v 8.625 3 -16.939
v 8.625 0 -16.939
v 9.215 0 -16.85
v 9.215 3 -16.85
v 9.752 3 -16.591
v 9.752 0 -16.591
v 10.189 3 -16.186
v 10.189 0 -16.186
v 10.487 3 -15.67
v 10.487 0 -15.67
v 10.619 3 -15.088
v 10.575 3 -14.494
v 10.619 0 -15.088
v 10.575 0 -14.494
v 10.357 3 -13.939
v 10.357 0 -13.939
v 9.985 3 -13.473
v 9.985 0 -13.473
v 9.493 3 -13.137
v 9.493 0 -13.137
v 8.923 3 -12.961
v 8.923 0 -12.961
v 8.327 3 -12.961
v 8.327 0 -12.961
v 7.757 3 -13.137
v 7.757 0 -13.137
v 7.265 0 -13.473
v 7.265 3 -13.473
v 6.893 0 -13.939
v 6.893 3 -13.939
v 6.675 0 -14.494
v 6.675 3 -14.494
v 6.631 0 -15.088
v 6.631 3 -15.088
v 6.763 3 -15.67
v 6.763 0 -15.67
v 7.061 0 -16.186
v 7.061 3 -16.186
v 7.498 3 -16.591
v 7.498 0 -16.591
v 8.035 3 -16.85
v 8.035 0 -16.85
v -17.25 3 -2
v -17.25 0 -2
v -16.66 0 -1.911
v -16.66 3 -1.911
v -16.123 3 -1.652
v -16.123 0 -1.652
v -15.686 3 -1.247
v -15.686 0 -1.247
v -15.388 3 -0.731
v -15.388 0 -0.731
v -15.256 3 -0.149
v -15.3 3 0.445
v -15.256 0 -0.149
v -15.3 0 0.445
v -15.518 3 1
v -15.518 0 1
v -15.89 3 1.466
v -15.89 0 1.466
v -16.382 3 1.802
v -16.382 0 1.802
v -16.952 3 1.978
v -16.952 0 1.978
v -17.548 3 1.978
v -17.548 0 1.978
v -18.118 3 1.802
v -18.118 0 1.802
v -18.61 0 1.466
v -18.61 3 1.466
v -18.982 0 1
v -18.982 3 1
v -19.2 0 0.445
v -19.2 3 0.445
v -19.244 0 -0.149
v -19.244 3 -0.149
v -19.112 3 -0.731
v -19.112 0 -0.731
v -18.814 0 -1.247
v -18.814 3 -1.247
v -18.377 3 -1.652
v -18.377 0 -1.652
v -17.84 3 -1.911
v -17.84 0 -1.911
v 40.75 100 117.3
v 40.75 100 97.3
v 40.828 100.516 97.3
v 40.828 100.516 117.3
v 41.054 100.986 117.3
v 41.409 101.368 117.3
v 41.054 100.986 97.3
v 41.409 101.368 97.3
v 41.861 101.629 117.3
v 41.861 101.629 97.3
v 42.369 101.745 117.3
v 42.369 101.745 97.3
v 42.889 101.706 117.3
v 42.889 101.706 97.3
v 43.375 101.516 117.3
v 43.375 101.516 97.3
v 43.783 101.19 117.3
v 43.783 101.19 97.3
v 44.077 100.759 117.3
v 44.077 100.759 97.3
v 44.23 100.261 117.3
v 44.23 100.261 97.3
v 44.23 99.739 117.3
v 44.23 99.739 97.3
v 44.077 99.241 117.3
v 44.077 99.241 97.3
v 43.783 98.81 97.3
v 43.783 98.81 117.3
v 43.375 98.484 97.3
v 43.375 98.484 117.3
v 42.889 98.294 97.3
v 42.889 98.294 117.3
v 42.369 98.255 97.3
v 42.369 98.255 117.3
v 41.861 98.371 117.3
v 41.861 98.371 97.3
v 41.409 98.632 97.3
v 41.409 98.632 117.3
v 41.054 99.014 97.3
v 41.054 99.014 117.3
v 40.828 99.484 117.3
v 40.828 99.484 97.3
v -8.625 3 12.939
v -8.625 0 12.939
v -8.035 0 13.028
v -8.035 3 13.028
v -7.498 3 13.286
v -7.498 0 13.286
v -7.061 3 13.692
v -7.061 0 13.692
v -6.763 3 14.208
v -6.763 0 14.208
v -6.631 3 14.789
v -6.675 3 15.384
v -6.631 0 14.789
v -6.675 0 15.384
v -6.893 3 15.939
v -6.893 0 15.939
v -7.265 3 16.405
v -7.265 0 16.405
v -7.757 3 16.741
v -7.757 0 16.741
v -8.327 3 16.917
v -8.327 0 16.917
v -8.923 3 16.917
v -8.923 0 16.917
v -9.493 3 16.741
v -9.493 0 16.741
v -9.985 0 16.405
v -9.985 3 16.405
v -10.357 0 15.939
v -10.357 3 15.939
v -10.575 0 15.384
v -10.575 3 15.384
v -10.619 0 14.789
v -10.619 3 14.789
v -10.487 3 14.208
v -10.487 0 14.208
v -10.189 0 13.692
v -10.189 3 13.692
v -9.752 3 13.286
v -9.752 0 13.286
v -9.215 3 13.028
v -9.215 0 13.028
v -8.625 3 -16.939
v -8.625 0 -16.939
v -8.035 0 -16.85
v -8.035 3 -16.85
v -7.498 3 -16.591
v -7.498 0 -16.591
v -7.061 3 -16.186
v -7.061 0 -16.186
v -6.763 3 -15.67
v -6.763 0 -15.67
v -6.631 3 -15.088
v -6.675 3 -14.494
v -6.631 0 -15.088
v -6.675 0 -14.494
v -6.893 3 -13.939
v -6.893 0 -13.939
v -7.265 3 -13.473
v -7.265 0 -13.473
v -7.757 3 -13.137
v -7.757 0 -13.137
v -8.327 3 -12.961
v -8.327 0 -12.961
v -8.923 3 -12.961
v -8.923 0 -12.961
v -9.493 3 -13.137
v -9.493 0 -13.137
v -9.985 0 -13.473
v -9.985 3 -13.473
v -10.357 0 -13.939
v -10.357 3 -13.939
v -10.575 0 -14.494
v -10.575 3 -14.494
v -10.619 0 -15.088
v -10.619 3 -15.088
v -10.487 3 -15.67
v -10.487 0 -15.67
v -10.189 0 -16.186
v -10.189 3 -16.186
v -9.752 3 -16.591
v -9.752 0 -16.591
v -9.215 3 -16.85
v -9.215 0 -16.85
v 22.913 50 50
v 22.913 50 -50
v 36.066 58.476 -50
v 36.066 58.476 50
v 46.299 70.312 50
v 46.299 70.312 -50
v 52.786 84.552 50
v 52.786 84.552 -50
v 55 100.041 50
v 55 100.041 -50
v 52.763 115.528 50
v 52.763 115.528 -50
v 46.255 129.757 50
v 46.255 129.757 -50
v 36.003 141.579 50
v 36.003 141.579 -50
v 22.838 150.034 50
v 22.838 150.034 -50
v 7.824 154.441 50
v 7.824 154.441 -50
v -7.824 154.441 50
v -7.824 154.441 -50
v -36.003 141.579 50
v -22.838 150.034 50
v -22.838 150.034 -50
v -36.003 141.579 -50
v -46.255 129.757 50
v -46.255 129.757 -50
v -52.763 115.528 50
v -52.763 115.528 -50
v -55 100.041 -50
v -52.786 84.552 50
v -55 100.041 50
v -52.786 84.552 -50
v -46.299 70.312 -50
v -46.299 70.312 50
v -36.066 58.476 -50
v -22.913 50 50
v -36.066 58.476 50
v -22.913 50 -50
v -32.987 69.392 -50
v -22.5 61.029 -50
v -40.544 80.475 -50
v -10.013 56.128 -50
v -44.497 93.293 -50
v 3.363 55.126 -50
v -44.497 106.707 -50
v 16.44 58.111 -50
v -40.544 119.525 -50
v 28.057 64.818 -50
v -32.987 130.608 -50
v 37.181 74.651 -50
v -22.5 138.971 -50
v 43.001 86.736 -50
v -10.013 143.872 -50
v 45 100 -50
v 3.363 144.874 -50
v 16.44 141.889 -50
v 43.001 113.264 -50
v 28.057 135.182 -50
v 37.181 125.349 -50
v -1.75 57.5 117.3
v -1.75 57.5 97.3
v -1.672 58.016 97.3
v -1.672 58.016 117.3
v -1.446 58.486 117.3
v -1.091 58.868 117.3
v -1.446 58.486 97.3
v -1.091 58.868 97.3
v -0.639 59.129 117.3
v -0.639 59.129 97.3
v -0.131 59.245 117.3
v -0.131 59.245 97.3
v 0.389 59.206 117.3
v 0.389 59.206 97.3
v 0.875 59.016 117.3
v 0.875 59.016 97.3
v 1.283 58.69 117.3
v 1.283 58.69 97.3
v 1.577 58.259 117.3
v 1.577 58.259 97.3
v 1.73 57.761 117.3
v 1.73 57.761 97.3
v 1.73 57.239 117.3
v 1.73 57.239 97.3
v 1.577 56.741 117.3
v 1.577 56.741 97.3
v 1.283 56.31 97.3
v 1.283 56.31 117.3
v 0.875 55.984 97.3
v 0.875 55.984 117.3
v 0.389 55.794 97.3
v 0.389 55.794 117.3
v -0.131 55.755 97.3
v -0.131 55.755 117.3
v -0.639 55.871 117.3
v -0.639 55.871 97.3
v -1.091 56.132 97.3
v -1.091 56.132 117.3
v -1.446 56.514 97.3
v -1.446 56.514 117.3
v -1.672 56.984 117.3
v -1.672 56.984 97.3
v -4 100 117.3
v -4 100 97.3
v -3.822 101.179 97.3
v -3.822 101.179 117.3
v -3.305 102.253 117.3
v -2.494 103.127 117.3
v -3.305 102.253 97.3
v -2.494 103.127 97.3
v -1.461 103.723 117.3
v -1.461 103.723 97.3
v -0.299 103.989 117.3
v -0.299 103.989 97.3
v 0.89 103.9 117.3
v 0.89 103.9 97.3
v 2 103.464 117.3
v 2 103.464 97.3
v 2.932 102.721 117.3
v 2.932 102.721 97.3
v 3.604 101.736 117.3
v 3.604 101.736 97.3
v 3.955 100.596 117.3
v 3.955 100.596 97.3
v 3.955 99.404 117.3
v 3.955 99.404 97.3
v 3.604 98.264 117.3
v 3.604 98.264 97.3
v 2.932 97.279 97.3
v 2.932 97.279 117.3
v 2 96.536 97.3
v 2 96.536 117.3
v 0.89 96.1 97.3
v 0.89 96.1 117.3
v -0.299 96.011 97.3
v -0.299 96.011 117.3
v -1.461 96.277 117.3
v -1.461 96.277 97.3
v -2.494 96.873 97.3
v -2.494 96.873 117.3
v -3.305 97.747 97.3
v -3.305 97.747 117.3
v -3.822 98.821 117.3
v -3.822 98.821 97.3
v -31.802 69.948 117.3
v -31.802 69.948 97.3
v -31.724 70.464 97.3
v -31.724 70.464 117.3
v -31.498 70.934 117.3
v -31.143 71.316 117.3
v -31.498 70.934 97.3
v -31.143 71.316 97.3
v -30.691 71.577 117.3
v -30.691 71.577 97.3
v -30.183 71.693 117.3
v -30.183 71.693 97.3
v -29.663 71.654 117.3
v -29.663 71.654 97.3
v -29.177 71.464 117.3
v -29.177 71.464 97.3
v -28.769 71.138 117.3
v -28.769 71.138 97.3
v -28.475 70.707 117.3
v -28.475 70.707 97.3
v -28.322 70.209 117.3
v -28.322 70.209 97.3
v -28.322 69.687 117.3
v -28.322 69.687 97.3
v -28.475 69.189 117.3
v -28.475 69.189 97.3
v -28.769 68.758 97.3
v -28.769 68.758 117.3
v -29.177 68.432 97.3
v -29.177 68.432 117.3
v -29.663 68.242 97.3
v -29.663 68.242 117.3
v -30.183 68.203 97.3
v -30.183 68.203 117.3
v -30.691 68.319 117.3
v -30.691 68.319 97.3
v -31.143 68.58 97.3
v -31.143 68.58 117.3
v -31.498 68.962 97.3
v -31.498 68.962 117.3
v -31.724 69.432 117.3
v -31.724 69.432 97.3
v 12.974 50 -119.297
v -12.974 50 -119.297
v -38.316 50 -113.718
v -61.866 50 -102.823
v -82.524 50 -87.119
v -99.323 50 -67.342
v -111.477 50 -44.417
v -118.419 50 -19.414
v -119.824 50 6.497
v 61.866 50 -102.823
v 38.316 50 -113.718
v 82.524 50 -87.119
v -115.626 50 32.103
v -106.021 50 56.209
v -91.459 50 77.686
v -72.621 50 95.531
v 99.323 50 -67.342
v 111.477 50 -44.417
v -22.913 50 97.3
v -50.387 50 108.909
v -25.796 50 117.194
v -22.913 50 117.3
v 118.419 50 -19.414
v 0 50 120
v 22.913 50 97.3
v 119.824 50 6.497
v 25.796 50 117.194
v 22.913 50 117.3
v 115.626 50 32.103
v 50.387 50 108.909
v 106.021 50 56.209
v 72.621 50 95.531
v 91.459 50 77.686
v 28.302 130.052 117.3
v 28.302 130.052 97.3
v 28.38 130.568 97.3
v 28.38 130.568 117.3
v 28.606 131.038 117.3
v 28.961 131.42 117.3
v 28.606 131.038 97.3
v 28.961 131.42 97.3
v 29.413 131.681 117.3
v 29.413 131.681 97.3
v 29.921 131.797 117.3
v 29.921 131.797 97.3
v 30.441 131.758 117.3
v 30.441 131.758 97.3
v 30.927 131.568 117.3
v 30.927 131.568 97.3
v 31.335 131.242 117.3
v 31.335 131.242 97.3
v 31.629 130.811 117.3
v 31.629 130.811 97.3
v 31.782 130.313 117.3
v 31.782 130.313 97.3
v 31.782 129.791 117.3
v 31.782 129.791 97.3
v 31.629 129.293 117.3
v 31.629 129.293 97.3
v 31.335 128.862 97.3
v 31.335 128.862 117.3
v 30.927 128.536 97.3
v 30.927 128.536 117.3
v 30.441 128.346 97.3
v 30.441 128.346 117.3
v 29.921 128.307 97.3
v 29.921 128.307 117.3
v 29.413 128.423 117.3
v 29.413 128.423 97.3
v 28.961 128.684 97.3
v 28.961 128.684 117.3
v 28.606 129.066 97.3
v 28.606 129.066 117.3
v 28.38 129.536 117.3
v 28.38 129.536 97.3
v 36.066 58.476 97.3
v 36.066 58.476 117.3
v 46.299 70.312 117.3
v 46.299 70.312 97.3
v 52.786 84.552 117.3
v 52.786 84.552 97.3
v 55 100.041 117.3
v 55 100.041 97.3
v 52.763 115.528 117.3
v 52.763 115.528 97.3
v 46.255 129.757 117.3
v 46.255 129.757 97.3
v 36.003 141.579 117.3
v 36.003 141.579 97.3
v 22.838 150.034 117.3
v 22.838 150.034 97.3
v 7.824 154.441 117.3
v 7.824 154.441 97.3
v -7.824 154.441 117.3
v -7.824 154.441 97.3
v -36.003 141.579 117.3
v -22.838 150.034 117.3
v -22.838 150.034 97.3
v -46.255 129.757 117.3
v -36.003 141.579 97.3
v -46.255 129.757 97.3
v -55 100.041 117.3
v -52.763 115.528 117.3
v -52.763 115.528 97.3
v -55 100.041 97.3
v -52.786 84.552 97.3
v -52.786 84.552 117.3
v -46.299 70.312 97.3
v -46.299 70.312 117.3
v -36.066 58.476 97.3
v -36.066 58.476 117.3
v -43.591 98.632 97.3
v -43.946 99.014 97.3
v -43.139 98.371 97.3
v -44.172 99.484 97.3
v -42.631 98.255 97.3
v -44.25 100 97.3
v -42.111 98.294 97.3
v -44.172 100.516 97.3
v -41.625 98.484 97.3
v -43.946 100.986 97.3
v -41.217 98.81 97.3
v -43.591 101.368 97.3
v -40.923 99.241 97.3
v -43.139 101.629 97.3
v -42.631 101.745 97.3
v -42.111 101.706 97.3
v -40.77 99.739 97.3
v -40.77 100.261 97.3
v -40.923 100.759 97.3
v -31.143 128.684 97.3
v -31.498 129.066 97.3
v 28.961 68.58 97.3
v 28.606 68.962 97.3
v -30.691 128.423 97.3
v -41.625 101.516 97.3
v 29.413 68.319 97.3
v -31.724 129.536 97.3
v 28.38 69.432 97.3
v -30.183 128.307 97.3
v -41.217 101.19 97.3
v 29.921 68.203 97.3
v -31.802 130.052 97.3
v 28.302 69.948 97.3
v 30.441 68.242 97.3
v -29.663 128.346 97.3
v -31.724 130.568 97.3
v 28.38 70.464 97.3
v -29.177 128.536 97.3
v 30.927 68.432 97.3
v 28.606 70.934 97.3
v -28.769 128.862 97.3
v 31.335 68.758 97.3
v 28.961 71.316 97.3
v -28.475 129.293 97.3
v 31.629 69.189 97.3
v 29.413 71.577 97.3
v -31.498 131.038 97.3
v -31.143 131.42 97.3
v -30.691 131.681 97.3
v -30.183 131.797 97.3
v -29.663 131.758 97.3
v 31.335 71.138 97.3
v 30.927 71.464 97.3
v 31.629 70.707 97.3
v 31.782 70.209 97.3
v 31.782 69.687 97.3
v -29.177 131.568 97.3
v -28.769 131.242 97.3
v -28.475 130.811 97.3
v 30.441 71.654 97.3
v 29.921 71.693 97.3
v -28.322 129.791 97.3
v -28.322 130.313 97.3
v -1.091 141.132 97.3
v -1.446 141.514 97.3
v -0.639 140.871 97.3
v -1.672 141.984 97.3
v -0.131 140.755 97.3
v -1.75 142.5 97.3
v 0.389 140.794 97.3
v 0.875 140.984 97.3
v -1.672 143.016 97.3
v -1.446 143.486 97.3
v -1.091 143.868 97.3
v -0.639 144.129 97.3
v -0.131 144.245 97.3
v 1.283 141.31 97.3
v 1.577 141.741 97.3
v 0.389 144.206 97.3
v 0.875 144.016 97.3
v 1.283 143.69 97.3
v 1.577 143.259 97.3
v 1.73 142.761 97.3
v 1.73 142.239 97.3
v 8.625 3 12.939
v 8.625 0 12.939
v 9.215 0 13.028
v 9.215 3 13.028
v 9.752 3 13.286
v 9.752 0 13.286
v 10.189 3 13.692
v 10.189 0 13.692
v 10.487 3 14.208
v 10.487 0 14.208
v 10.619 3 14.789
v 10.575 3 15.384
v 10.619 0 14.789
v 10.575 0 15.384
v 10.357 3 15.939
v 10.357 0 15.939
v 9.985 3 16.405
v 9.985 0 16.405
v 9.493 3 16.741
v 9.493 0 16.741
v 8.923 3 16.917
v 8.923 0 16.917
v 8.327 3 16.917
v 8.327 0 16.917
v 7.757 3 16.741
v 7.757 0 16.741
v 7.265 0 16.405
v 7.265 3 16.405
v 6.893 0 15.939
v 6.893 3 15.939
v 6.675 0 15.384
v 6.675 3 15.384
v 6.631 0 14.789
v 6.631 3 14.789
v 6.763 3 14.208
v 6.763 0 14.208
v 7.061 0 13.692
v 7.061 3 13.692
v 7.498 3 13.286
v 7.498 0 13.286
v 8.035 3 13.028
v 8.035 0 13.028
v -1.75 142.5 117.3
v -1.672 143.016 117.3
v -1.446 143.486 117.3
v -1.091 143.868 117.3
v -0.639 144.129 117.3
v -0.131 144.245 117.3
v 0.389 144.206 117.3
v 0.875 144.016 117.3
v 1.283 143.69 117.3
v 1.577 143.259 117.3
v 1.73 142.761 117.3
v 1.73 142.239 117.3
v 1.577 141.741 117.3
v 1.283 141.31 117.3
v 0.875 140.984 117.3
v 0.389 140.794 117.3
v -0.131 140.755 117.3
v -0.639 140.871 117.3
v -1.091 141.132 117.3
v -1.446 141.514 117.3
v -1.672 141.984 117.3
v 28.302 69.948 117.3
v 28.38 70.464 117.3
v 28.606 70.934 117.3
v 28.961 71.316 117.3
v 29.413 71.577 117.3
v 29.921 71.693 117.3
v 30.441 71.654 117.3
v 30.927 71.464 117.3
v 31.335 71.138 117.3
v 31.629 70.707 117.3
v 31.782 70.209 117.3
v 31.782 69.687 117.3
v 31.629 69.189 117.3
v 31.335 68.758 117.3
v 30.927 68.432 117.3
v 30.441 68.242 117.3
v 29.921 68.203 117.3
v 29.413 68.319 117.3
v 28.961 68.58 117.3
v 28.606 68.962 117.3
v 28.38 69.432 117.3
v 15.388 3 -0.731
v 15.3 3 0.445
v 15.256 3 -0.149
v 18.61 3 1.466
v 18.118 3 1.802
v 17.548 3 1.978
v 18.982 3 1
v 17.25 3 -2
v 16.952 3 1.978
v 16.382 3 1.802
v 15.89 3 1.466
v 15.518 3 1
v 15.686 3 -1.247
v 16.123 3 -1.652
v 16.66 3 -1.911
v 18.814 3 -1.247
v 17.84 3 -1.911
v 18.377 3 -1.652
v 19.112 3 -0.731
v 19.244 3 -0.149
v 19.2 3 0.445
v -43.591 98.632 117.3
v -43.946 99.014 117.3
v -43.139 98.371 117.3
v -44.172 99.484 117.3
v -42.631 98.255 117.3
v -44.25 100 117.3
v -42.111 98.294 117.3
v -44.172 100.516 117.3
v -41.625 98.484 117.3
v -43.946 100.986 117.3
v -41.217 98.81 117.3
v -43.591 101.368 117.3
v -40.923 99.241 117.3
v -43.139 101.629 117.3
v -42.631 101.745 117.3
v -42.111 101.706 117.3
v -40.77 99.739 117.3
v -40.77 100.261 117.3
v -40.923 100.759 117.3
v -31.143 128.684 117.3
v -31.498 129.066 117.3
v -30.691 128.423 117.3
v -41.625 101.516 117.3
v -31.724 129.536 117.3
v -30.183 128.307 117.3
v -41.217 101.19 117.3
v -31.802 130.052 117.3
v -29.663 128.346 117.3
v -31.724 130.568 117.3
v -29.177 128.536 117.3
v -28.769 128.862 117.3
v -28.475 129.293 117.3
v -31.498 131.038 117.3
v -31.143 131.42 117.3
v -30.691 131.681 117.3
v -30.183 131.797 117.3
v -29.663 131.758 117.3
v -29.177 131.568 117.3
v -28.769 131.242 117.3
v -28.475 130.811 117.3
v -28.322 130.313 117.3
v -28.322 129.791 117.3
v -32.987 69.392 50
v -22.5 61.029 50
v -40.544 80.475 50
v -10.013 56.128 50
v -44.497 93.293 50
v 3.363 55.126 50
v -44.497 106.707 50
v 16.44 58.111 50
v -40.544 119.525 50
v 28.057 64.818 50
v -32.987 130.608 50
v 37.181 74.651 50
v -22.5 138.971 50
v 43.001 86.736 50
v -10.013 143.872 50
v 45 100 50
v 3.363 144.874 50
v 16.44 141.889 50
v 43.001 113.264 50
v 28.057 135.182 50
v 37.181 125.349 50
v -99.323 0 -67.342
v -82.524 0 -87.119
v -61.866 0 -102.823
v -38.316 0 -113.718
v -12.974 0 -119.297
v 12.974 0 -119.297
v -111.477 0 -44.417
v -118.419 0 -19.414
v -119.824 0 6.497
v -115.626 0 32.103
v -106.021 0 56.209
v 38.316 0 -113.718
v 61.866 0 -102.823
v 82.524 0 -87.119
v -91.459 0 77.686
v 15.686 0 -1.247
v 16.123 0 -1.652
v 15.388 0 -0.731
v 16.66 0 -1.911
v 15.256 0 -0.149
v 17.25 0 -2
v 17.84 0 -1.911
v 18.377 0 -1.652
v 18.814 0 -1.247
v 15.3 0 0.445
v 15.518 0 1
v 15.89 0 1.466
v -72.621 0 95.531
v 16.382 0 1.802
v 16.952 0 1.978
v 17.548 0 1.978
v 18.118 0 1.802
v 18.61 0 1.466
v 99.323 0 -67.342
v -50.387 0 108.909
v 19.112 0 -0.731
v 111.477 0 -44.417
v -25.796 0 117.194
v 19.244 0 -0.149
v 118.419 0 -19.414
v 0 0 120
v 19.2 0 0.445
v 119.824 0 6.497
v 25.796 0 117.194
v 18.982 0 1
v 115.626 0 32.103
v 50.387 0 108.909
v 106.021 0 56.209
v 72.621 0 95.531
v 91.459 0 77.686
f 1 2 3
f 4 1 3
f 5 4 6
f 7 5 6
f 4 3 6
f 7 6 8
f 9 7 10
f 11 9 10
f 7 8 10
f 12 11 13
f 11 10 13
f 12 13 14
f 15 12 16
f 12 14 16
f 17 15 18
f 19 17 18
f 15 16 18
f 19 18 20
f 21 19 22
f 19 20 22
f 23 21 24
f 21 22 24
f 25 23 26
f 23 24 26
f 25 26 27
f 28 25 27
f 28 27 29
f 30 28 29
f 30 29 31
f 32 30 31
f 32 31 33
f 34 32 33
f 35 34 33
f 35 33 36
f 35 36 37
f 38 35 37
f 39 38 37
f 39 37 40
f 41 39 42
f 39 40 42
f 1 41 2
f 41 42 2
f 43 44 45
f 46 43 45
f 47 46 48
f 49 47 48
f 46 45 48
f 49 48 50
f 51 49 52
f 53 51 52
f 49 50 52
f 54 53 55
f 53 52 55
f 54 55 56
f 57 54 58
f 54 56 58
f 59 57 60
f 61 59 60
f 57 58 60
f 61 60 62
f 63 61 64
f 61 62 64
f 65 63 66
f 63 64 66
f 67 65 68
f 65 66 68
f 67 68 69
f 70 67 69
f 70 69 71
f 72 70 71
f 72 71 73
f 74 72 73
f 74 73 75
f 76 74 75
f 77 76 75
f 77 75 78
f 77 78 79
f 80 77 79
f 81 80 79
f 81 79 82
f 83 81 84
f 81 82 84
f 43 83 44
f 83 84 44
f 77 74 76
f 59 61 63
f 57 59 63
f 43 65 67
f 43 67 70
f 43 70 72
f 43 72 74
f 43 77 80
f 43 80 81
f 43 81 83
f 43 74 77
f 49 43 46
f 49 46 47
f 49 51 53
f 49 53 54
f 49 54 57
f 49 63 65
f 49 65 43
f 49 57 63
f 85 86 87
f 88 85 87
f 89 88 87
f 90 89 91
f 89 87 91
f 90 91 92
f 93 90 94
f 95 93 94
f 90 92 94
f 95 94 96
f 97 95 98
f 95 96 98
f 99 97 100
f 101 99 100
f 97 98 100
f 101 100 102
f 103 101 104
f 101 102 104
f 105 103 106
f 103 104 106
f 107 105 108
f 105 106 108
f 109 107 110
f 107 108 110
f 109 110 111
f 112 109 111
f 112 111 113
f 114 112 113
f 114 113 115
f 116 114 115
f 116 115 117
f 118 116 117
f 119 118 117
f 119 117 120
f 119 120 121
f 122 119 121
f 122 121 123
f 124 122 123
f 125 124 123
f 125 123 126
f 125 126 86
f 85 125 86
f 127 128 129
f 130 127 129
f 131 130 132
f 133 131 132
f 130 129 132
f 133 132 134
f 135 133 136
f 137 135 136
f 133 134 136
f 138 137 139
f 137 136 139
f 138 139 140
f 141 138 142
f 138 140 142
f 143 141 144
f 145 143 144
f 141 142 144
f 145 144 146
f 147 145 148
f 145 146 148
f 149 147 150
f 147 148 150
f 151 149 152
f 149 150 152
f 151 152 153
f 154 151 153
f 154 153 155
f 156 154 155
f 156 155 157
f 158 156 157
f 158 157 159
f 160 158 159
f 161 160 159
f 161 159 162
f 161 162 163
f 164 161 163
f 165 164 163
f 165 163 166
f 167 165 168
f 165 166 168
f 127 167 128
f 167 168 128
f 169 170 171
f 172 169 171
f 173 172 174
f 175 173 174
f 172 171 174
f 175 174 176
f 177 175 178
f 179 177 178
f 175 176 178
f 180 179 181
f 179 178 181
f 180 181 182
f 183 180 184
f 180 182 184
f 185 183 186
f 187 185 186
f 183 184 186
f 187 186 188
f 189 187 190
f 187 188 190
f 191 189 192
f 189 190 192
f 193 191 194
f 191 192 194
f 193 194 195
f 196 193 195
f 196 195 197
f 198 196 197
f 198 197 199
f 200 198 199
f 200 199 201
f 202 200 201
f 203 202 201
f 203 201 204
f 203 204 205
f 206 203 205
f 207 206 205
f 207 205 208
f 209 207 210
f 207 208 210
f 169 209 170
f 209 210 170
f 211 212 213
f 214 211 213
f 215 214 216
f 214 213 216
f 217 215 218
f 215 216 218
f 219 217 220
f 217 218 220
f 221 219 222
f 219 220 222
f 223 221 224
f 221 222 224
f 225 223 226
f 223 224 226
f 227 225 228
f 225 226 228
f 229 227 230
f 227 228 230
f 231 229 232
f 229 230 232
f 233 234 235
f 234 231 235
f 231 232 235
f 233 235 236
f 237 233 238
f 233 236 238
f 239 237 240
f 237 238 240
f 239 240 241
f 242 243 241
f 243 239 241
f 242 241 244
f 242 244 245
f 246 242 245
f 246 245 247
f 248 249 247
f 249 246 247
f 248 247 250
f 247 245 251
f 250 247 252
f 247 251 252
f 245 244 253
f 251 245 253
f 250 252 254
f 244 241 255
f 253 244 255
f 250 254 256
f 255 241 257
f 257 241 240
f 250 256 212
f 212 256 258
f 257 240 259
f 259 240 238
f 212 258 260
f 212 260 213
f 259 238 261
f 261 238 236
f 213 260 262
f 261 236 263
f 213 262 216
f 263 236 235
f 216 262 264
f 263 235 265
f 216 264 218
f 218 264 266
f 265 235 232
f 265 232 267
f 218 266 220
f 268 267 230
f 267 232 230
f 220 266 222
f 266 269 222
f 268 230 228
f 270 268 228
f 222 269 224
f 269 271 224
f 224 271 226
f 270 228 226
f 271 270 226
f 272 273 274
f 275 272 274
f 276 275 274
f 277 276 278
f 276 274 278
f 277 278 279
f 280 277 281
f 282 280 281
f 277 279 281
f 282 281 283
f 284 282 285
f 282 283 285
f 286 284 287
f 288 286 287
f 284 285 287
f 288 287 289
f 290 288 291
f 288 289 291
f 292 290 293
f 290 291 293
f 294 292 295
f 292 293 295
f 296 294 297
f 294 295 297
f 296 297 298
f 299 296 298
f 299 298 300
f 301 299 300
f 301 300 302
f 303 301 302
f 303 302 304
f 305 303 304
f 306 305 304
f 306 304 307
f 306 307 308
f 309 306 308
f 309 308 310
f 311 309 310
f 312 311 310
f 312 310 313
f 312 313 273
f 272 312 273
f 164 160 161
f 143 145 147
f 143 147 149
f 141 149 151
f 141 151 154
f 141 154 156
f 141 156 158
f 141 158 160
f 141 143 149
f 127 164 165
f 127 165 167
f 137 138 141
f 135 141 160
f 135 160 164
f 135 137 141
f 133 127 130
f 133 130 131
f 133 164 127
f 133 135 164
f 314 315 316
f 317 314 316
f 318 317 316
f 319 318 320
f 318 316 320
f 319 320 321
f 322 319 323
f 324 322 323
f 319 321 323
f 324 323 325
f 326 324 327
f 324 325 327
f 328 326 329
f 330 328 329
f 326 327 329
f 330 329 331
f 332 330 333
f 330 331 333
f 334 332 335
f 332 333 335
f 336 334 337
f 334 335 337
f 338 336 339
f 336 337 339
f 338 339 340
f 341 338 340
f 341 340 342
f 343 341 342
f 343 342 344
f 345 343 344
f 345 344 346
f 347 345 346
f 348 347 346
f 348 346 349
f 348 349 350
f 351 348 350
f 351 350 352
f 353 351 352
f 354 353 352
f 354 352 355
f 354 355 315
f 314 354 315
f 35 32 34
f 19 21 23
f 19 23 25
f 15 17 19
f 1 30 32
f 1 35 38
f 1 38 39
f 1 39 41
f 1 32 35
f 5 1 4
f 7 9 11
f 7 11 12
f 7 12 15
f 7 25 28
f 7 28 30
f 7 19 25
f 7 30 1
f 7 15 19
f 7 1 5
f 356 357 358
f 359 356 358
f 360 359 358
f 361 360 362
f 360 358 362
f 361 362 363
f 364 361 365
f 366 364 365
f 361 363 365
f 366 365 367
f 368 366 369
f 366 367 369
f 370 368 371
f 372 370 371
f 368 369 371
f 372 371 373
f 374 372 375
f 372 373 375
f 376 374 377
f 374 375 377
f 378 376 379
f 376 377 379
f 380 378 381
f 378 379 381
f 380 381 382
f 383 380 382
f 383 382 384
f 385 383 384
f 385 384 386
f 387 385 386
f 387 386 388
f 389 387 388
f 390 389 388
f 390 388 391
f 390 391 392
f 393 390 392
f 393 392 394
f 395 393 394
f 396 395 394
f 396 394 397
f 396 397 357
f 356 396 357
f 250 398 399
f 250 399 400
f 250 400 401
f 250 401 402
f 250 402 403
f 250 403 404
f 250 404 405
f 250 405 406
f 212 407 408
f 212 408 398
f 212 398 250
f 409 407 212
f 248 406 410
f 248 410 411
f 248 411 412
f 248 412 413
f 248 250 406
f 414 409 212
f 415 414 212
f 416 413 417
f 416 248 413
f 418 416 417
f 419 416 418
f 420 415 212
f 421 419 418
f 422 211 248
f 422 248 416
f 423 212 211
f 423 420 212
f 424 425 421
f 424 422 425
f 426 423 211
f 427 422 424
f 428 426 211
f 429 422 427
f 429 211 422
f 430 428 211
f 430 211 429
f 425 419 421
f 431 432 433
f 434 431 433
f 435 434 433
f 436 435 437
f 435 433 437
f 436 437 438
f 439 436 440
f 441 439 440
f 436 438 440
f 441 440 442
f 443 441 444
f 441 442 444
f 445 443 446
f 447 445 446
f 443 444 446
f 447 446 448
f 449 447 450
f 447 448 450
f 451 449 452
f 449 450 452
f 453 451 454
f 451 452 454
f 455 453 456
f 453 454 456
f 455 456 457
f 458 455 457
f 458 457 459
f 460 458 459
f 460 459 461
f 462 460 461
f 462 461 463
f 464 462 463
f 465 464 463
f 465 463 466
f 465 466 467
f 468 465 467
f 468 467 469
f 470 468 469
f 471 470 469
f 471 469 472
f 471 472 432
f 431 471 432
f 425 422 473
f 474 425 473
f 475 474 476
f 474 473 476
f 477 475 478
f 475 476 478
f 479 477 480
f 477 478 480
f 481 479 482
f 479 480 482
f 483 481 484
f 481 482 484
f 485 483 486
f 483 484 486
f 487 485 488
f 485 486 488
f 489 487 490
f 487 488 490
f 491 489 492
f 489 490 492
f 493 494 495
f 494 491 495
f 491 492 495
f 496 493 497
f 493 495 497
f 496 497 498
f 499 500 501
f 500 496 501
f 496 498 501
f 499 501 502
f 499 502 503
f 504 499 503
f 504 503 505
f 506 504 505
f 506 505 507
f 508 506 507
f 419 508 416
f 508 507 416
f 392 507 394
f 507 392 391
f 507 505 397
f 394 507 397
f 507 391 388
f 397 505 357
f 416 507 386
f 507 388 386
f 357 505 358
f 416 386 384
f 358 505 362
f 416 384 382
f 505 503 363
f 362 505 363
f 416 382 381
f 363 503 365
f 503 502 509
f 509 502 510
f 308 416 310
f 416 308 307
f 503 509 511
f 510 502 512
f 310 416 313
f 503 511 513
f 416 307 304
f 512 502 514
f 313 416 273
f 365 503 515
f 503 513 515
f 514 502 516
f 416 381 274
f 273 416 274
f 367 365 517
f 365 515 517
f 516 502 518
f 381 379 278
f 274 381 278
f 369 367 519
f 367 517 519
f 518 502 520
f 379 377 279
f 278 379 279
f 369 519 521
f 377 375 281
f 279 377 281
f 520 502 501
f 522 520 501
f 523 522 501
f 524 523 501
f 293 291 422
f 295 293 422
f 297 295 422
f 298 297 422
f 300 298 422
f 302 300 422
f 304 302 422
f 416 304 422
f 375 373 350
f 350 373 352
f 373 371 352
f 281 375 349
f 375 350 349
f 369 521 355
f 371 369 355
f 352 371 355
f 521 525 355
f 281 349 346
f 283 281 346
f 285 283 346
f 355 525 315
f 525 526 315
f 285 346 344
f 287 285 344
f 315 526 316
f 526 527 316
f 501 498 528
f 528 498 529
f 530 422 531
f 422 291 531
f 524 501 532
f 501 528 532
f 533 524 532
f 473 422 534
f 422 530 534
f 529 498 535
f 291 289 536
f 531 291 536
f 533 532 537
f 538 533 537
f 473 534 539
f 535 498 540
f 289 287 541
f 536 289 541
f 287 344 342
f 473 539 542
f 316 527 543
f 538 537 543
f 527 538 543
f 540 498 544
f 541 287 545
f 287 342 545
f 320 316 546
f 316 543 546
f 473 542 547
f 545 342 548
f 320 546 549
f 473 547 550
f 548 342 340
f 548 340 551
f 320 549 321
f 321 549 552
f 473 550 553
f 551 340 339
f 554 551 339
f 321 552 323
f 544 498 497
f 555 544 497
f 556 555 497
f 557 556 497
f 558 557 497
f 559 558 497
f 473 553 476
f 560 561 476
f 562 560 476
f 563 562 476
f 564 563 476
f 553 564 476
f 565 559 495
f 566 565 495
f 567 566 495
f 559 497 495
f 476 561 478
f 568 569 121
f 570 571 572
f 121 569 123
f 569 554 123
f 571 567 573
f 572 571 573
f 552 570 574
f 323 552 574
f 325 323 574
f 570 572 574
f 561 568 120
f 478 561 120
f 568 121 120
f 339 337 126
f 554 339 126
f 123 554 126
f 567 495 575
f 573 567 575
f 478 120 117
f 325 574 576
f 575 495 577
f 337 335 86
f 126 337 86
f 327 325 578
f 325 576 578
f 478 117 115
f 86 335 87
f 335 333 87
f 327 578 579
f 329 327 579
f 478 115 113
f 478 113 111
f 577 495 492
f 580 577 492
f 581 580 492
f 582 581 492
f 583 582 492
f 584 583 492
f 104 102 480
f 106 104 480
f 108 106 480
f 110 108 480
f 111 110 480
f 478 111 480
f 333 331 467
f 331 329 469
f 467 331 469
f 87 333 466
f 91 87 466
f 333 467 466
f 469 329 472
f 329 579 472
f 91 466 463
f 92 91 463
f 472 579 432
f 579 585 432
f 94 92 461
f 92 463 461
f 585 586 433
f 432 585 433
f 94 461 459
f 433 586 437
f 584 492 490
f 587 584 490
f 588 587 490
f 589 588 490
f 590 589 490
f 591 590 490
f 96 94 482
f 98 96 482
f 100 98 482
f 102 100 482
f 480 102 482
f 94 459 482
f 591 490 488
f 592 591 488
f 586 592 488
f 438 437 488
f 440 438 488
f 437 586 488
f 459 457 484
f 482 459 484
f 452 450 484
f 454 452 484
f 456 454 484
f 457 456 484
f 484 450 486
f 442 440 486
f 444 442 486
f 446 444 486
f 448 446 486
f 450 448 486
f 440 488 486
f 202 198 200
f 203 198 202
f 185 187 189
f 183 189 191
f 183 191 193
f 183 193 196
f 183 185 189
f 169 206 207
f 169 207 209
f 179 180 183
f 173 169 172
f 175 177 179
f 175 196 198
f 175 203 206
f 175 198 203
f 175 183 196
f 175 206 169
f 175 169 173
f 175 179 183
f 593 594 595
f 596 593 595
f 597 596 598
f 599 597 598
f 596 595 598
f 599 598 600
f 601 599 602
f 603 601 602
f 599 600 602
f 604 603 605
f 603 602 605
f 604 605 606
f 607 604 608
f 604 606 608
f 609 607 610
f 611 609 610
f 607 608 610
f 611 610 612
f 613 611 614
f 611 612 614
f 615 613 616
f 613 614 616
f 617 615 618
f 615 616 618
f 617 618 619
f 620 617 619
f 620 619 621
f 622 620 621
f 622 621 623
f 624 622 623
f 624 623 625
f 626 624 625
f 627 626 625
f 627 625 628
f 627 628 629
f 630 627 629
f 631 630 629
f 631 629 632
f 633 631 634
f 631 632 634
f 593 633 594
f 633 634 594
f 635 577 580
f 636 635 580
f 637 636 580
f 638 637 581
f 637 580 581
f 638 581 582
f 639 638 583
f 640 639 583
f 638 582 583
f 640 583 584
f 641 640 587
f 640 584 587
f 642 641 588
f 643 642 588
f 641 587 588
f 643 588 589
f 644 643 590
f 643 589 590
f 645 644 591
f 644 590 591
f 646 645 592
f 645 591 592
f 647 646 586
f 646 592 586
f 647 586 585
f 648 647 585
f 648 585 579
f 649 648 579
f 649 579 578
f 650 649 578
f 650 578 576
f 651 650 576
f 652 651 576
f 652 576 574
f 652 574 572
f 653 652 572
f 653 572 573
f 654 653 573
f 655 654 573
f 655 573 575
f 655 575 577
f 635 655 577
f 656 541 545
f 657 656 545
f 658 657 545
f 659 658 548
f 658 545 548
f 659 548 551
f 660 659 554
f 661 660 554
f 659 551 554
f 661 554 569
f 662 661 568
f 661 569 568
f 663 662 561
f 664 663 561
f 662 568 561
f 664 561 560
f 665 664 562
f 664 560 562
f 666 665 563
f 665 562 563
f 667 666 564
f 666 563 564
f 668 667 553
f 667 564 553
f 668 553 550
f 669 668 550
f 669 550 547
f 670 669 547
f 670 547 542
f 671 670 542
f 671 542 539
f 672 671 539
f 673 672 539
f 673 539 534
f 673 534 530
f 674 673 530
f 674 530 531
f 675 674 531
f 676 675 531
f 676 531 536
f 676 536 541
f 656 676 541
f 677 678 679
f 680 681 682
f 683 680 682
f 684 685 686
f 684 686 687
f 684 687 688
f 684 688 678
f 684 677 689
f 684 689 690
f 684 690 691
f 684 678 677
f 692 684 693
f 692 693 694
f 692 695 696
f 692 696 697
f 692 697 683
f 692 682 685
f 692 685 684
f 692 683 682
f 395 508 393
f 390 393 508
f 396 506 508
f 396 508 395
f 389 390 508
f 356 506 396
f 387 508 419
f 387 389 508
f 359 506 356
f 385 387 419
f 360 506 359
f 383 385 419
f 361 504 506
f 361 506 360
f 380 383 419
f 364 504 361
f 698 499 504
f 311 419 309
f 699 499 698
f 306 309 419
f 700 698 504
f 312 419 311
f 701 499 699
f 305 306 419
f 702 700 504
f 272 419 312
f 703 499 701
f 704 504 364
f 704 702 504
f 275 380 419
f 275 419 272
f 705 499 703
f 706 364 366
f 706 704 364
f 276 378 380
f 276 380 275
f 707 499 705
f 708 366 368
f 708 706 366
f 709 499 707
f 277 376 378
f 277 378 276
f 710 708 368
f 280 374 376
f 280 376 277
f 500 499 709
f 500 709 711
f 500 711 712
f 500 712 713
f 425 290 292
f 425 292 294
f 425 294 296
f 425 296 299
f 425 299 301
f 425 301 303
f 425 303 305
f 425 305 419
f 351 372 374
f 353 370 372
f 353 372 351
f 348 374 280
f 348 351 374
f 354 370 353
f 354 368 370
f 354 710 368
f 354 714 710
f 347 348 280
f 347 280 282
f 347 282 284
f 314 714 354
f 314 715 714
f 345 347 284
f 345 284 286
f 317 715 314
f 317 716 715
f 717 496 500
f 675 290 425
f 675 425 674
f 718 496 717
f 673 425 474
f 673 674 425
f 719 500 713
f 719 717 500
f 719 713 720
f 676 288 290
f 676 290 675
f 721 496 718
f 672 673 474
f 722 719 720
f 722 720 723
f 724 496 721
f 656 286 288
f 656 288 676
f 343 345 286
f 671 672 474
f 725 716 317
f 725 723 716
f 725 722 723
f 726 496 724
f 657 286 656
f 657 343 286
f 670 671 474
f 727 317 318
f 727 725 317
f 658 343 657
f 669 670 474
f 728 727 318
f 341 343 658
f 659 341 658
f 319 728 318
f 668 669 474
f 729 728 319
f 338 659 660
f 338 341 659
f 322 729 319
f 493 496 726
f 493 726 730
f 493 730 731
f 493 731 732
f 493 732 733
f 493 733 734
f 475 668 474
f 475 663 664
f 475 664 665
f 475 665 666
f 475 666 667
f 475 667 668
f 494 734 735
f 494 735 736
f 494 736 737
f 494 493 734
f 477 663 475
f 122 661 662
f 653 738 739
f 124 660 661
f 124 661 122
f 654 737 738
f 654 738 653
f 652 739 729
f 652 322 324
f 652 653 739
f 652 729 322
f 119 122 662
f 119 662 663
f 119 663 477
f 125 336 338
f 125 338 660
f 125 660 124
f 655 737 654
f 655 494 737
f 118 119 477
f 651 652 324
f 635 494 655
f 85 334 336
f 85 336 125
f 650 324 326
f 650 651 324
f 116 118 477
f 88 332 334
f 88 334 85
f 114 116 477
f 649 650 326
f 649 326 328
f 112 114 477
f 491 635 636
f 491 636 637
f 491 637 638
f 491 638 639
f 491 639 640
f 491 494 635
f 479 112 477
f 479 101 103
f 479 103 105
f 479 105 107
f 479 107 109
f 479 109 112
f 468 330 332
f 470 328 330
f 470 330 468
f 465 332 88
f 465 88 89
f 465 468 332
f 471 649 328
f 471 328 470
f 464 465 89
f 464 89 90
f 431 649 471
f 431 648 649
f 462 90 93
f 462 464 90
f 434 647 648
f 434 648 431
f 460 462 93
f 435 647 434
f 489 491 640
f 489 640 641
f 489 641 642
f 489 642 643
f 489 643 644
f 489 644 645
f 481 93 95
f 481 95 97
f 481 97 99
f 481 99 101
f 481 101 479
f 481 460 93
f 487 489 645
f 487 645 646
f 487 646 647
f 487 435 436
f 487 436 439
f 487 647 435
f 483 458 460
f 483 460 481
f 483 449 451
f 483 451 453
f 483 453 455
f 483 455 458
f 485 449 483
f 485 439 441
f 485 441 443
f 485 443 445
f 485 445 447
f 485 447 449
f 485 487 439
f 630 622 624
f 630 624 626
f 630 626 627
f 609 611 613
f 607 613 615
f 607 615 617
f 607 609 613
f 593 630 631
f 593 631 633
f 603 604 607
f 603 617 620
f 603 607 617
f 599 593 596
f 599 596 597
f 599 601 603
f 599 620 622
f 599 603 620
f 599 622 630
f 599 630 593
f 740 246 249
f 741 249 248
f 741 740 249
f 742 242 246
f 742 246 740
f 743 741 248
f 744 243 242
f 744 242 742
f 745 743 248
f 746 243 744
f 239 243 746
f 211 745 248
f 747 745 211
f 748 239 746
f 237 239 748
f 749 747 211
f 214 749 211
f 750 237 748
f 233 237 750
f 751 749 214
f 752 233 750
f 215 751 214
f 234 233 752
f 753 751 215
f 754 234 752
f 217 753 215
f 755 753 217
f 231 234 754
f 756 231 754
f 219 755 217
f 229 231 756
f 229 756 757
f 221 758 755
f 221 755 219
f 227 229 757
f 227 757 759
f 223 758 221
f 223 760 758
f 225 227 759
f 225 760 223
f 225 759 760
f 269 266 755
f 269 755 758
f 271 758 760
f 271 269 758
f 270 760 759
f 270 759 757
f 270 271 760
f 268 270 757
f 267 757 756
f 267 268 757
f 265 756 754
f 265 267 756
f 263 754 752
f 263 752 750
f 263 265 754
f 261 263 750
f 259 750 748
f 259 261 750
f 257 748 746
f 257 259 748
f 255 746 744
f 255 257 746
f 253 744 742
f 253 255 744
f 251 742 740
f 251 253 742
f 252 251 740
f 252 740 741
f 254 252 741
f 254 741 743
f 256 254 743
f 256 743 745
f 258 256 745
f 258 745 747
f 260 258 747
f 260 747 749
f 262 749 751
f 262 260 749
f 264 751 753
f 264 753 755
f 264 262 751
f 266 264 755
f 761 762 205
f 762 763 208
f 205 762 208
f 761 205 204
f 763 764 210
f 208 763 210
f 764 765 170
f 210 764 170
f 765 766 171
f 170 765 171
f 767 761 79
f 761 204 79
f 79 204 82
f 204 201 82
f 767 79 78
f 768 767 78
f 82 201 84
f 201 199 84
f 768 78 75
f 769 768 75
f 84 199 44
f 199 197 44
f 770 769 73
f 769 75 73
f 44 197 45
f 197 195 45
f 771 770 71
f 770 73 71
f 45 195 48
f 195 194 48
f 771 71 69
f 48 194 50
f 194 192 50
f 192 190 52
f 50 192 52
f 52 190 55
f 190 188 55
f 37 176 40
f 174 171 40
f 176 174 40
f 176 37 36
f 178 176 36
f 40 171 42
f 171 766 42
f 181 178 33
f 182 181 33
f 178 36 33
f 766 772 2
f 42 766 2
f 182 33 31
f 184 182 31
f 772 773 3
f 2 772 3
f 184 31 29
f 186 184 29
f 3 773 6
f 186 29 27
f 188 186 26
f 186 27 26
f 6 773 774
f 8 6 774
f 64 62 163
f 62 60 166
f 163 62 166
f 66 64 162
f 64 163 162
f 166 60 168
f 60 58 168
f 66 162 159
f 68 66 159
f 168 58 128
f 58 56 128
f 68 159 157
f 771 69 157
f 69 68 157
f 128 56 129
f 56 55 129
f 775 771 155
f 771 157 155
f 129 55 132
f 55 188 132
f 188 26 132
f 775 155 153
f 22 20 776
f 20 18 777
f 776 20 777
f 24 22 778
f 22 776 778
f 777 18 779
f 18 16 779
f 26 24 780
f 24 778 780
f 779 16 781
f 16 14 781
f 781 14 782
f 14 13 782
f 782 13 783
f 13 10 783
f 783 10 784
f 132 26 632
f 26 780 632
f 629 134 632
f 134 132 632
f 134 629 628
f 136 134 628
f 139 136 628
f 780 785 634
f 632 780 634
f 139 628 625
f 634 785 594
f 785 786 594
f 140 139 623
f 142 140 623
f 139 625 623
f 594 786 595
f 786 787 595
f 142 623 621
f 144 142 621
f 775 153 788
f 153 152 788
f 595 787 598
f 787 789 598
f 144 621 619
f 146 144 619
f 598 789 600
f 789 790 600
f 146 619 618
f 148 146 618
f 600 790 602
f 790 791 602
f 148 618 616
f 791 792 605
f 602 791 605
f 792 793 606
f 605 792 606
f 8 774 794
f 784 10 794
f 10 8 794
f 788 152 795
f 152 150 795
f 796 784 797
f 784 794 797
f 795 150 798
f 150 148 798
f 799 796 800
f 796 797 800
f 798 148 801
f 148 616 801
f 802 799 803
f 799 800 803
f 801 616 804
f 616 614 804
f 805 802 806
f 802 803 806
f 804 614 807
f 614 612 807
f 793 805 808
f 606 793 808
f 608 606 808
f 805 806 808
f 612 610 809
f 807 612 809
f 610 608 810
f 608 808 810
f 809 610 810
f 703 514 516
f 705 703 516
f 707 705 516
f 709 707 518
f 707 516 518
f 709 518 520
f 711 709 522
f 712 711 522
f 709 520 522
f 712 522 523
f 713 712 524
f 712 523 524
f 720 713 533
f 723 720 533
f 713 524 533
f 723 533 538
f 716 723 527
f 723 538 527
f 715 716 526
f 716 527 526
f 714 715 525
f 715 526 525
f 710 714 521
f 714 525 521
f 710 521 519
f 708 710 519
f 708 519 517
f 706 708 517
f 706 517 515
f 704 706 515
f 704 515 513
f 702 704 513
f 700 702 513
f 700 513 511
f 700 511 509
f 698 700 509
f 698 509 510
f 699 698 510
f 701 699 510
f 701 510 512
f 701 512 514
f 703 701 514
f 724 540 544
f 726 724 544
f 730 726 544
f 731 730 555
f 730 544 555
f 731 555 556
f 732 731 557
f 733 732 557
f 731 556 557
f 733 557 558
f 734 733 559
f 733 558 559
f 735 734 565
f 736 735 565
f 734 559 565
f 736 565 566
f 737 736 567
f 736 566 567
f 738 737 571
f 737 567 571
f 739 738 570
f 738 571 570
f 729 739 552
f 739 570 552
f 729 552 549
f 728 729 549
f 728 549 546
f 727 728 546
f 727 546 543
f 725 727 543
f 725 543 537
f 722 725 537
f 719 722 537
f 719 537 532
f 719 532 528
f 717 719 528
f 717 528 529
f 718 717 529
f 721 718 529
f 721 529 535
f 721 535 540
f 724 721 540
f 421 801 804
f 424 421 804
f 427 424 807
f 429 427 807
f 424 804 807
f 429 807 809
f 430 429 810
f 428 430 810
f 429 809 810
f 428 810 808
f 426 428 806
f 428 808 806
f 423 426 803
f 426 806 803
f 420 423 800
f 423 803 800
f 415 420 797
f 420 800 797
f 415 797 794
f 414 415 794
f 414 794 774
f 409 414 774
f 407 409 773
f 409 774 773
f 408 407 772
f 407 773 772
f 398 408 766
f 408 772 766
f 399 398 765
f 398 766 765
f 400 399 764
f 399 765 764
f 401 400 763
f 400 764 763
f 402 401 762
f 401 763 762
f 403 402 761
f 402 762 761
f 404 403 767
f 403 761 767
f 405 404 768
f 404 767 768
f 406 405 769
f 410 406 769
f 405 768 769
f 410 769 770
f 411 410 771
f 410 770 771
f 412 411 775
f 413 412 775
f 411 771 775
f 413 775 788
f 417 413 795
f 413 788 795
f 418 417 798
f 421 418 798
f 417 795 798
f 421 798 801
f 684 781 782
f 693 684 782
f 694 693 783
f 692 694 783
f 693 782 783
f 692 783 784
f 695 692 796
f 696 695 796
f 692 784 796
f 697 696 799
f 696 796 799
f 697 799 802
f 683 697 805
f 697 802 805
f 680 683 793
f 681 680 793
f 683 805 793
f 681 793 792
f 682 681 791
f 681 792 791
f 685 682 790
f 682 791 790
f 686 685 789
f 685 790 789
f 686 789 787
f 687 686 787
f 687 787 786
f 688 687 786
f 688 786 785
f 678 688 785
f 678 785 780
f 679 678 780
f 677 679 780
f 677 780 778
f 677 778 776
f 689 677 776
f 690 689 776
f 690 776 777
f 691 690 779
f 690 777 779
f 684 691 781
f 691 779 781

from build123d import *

# Parameters (mm, degrees)
SKETCH_1_R             = 120
EXTRUDE_1_DEPTH        = 50
EXTRUDE_1_2_DEPTH      = 50
EXTRUDE_1_2_DEPTH_BACK = 50
SKETCH_2_R             = 55
SKETCH_2_R_2           = 45
SKETCH_7_R             = 2
CUT_EXTRUDE_2_DEPTH    = 3
SKETCH_8_R             = 55
EXTRUDE_2_DEPTH        = 20
SKETCH_9_R             = 1.75
SKETCH_9_R_2           = 4
CUT_EXTRUDE_3_DEPTH    = 293.65045703


with BuildPart() as part:
    # 草图1 → Extrude 1 (new body)
    with BuildSketch(Plane(origin=(0, 0, 0), x_dir=(1, 0, 0), z_dir=(0, 1, 0))):
        with Locations(Location((0, 0, 0), (0, 0, 270))):
            Circle(SKETCH_1_R)
    extrude(amount=EXTRUDE_1_DEPTH)

    # 草图2 → Extrude 1 2 (add, two sides: drawn at the far end of the back side and taken through both)
    with BuildSketch(Plane.XY.offset(-EXTRUDE_1_2_DEPTH_BACK)):
        with Locations((0, 100)):
            Circle(SKETCH_2_R)
        with Locations((0, 100)):
            Circle(SKETCH_2_R_2, mode=Mode.SUBTRACT)
    extrude(amount=EXTRUDE_1_2_DEPTH + EXTRUDE_1_2_DEPTH_BACK)

    # 草图7 → 切除-拉伸2 (cut)
    with BuildSketch(Plane.XZ):
        with Locations(Location((17.25, 0, 0), (0, 0, 270))):
            Circle(SKETCH_7_R)
        with Locations(Location((8.625, -14.938938215, 0), (0, 0, 270))):
            Circle(SKETCH_7_R)
        with Locations(Location((-8.625, -14.938938215, 0), (0, 0, 270))):
            Circle(SKETCH_7_R)
        with Locations(Location((-17.25, 0, 0), (0, 0, 270))):
            Circle(SKETCH_7_R)
        with Locations(Location((-8.625, 14.938938215, 0), (0, 0, 270))):
            Circle(SKETCH_7_R)
        with Locations(Location((8.625, 14.938938215, 0), (0, 0, 270))):
            Circle(SKETCH_7_R)
    extrude(amount=-CUT_EXTRUDE_2_DEPTH, mode=Mode.SUBTRACT)

    # 草图8 → 凸台-拉伸2 (add)
    with BuildSketch(Plane.XY.offset(97.3)):
        with Locations((0, 100)):
            Circle(SKETCH_8_R)
    extrude(amount=EXTRUDE_2_DEPTH)

    # 草图9 → 切除-拉伸3 (cut, through all)
    with BuildSketch(Plane(origin=(0, 0, 97.3), x_dir=(-1, 0, 0), z_dir=(0, 0, -1))):
        with Locations((42.5, 100)):
            Circle(SKETCH_9_R)
        with Locations((30.0520382, 69.9479618)):
            Circle(SKETCH_9_R)
        with Locations((0, 57.5)):
            Circle(SKETCH_9_R)
        with Locations((-30.0520382, 69.9479618)):
            Circle(SKETCH_9_R)
        with Locations((-42.5, 100)):
            Circle(SKETCH_9_R)
        with Locations((-30.0520382, 130.0520382)):
            Circle(SKETCH_9_R)
        with Locations((0, 142.5)):
            Circle(SKETCH_9_R)
        with Locations((30.0520382, 130.0520382)):
            Circle(SKETCH_9_R)
        with Locations((0, 100)):
            Circle(SKETCH_9_R_2)
    extrude(amount=-CUT_EXTRUDE_3_DEPTH, mode=Mode.SUBTRACT)


solid = part.part
